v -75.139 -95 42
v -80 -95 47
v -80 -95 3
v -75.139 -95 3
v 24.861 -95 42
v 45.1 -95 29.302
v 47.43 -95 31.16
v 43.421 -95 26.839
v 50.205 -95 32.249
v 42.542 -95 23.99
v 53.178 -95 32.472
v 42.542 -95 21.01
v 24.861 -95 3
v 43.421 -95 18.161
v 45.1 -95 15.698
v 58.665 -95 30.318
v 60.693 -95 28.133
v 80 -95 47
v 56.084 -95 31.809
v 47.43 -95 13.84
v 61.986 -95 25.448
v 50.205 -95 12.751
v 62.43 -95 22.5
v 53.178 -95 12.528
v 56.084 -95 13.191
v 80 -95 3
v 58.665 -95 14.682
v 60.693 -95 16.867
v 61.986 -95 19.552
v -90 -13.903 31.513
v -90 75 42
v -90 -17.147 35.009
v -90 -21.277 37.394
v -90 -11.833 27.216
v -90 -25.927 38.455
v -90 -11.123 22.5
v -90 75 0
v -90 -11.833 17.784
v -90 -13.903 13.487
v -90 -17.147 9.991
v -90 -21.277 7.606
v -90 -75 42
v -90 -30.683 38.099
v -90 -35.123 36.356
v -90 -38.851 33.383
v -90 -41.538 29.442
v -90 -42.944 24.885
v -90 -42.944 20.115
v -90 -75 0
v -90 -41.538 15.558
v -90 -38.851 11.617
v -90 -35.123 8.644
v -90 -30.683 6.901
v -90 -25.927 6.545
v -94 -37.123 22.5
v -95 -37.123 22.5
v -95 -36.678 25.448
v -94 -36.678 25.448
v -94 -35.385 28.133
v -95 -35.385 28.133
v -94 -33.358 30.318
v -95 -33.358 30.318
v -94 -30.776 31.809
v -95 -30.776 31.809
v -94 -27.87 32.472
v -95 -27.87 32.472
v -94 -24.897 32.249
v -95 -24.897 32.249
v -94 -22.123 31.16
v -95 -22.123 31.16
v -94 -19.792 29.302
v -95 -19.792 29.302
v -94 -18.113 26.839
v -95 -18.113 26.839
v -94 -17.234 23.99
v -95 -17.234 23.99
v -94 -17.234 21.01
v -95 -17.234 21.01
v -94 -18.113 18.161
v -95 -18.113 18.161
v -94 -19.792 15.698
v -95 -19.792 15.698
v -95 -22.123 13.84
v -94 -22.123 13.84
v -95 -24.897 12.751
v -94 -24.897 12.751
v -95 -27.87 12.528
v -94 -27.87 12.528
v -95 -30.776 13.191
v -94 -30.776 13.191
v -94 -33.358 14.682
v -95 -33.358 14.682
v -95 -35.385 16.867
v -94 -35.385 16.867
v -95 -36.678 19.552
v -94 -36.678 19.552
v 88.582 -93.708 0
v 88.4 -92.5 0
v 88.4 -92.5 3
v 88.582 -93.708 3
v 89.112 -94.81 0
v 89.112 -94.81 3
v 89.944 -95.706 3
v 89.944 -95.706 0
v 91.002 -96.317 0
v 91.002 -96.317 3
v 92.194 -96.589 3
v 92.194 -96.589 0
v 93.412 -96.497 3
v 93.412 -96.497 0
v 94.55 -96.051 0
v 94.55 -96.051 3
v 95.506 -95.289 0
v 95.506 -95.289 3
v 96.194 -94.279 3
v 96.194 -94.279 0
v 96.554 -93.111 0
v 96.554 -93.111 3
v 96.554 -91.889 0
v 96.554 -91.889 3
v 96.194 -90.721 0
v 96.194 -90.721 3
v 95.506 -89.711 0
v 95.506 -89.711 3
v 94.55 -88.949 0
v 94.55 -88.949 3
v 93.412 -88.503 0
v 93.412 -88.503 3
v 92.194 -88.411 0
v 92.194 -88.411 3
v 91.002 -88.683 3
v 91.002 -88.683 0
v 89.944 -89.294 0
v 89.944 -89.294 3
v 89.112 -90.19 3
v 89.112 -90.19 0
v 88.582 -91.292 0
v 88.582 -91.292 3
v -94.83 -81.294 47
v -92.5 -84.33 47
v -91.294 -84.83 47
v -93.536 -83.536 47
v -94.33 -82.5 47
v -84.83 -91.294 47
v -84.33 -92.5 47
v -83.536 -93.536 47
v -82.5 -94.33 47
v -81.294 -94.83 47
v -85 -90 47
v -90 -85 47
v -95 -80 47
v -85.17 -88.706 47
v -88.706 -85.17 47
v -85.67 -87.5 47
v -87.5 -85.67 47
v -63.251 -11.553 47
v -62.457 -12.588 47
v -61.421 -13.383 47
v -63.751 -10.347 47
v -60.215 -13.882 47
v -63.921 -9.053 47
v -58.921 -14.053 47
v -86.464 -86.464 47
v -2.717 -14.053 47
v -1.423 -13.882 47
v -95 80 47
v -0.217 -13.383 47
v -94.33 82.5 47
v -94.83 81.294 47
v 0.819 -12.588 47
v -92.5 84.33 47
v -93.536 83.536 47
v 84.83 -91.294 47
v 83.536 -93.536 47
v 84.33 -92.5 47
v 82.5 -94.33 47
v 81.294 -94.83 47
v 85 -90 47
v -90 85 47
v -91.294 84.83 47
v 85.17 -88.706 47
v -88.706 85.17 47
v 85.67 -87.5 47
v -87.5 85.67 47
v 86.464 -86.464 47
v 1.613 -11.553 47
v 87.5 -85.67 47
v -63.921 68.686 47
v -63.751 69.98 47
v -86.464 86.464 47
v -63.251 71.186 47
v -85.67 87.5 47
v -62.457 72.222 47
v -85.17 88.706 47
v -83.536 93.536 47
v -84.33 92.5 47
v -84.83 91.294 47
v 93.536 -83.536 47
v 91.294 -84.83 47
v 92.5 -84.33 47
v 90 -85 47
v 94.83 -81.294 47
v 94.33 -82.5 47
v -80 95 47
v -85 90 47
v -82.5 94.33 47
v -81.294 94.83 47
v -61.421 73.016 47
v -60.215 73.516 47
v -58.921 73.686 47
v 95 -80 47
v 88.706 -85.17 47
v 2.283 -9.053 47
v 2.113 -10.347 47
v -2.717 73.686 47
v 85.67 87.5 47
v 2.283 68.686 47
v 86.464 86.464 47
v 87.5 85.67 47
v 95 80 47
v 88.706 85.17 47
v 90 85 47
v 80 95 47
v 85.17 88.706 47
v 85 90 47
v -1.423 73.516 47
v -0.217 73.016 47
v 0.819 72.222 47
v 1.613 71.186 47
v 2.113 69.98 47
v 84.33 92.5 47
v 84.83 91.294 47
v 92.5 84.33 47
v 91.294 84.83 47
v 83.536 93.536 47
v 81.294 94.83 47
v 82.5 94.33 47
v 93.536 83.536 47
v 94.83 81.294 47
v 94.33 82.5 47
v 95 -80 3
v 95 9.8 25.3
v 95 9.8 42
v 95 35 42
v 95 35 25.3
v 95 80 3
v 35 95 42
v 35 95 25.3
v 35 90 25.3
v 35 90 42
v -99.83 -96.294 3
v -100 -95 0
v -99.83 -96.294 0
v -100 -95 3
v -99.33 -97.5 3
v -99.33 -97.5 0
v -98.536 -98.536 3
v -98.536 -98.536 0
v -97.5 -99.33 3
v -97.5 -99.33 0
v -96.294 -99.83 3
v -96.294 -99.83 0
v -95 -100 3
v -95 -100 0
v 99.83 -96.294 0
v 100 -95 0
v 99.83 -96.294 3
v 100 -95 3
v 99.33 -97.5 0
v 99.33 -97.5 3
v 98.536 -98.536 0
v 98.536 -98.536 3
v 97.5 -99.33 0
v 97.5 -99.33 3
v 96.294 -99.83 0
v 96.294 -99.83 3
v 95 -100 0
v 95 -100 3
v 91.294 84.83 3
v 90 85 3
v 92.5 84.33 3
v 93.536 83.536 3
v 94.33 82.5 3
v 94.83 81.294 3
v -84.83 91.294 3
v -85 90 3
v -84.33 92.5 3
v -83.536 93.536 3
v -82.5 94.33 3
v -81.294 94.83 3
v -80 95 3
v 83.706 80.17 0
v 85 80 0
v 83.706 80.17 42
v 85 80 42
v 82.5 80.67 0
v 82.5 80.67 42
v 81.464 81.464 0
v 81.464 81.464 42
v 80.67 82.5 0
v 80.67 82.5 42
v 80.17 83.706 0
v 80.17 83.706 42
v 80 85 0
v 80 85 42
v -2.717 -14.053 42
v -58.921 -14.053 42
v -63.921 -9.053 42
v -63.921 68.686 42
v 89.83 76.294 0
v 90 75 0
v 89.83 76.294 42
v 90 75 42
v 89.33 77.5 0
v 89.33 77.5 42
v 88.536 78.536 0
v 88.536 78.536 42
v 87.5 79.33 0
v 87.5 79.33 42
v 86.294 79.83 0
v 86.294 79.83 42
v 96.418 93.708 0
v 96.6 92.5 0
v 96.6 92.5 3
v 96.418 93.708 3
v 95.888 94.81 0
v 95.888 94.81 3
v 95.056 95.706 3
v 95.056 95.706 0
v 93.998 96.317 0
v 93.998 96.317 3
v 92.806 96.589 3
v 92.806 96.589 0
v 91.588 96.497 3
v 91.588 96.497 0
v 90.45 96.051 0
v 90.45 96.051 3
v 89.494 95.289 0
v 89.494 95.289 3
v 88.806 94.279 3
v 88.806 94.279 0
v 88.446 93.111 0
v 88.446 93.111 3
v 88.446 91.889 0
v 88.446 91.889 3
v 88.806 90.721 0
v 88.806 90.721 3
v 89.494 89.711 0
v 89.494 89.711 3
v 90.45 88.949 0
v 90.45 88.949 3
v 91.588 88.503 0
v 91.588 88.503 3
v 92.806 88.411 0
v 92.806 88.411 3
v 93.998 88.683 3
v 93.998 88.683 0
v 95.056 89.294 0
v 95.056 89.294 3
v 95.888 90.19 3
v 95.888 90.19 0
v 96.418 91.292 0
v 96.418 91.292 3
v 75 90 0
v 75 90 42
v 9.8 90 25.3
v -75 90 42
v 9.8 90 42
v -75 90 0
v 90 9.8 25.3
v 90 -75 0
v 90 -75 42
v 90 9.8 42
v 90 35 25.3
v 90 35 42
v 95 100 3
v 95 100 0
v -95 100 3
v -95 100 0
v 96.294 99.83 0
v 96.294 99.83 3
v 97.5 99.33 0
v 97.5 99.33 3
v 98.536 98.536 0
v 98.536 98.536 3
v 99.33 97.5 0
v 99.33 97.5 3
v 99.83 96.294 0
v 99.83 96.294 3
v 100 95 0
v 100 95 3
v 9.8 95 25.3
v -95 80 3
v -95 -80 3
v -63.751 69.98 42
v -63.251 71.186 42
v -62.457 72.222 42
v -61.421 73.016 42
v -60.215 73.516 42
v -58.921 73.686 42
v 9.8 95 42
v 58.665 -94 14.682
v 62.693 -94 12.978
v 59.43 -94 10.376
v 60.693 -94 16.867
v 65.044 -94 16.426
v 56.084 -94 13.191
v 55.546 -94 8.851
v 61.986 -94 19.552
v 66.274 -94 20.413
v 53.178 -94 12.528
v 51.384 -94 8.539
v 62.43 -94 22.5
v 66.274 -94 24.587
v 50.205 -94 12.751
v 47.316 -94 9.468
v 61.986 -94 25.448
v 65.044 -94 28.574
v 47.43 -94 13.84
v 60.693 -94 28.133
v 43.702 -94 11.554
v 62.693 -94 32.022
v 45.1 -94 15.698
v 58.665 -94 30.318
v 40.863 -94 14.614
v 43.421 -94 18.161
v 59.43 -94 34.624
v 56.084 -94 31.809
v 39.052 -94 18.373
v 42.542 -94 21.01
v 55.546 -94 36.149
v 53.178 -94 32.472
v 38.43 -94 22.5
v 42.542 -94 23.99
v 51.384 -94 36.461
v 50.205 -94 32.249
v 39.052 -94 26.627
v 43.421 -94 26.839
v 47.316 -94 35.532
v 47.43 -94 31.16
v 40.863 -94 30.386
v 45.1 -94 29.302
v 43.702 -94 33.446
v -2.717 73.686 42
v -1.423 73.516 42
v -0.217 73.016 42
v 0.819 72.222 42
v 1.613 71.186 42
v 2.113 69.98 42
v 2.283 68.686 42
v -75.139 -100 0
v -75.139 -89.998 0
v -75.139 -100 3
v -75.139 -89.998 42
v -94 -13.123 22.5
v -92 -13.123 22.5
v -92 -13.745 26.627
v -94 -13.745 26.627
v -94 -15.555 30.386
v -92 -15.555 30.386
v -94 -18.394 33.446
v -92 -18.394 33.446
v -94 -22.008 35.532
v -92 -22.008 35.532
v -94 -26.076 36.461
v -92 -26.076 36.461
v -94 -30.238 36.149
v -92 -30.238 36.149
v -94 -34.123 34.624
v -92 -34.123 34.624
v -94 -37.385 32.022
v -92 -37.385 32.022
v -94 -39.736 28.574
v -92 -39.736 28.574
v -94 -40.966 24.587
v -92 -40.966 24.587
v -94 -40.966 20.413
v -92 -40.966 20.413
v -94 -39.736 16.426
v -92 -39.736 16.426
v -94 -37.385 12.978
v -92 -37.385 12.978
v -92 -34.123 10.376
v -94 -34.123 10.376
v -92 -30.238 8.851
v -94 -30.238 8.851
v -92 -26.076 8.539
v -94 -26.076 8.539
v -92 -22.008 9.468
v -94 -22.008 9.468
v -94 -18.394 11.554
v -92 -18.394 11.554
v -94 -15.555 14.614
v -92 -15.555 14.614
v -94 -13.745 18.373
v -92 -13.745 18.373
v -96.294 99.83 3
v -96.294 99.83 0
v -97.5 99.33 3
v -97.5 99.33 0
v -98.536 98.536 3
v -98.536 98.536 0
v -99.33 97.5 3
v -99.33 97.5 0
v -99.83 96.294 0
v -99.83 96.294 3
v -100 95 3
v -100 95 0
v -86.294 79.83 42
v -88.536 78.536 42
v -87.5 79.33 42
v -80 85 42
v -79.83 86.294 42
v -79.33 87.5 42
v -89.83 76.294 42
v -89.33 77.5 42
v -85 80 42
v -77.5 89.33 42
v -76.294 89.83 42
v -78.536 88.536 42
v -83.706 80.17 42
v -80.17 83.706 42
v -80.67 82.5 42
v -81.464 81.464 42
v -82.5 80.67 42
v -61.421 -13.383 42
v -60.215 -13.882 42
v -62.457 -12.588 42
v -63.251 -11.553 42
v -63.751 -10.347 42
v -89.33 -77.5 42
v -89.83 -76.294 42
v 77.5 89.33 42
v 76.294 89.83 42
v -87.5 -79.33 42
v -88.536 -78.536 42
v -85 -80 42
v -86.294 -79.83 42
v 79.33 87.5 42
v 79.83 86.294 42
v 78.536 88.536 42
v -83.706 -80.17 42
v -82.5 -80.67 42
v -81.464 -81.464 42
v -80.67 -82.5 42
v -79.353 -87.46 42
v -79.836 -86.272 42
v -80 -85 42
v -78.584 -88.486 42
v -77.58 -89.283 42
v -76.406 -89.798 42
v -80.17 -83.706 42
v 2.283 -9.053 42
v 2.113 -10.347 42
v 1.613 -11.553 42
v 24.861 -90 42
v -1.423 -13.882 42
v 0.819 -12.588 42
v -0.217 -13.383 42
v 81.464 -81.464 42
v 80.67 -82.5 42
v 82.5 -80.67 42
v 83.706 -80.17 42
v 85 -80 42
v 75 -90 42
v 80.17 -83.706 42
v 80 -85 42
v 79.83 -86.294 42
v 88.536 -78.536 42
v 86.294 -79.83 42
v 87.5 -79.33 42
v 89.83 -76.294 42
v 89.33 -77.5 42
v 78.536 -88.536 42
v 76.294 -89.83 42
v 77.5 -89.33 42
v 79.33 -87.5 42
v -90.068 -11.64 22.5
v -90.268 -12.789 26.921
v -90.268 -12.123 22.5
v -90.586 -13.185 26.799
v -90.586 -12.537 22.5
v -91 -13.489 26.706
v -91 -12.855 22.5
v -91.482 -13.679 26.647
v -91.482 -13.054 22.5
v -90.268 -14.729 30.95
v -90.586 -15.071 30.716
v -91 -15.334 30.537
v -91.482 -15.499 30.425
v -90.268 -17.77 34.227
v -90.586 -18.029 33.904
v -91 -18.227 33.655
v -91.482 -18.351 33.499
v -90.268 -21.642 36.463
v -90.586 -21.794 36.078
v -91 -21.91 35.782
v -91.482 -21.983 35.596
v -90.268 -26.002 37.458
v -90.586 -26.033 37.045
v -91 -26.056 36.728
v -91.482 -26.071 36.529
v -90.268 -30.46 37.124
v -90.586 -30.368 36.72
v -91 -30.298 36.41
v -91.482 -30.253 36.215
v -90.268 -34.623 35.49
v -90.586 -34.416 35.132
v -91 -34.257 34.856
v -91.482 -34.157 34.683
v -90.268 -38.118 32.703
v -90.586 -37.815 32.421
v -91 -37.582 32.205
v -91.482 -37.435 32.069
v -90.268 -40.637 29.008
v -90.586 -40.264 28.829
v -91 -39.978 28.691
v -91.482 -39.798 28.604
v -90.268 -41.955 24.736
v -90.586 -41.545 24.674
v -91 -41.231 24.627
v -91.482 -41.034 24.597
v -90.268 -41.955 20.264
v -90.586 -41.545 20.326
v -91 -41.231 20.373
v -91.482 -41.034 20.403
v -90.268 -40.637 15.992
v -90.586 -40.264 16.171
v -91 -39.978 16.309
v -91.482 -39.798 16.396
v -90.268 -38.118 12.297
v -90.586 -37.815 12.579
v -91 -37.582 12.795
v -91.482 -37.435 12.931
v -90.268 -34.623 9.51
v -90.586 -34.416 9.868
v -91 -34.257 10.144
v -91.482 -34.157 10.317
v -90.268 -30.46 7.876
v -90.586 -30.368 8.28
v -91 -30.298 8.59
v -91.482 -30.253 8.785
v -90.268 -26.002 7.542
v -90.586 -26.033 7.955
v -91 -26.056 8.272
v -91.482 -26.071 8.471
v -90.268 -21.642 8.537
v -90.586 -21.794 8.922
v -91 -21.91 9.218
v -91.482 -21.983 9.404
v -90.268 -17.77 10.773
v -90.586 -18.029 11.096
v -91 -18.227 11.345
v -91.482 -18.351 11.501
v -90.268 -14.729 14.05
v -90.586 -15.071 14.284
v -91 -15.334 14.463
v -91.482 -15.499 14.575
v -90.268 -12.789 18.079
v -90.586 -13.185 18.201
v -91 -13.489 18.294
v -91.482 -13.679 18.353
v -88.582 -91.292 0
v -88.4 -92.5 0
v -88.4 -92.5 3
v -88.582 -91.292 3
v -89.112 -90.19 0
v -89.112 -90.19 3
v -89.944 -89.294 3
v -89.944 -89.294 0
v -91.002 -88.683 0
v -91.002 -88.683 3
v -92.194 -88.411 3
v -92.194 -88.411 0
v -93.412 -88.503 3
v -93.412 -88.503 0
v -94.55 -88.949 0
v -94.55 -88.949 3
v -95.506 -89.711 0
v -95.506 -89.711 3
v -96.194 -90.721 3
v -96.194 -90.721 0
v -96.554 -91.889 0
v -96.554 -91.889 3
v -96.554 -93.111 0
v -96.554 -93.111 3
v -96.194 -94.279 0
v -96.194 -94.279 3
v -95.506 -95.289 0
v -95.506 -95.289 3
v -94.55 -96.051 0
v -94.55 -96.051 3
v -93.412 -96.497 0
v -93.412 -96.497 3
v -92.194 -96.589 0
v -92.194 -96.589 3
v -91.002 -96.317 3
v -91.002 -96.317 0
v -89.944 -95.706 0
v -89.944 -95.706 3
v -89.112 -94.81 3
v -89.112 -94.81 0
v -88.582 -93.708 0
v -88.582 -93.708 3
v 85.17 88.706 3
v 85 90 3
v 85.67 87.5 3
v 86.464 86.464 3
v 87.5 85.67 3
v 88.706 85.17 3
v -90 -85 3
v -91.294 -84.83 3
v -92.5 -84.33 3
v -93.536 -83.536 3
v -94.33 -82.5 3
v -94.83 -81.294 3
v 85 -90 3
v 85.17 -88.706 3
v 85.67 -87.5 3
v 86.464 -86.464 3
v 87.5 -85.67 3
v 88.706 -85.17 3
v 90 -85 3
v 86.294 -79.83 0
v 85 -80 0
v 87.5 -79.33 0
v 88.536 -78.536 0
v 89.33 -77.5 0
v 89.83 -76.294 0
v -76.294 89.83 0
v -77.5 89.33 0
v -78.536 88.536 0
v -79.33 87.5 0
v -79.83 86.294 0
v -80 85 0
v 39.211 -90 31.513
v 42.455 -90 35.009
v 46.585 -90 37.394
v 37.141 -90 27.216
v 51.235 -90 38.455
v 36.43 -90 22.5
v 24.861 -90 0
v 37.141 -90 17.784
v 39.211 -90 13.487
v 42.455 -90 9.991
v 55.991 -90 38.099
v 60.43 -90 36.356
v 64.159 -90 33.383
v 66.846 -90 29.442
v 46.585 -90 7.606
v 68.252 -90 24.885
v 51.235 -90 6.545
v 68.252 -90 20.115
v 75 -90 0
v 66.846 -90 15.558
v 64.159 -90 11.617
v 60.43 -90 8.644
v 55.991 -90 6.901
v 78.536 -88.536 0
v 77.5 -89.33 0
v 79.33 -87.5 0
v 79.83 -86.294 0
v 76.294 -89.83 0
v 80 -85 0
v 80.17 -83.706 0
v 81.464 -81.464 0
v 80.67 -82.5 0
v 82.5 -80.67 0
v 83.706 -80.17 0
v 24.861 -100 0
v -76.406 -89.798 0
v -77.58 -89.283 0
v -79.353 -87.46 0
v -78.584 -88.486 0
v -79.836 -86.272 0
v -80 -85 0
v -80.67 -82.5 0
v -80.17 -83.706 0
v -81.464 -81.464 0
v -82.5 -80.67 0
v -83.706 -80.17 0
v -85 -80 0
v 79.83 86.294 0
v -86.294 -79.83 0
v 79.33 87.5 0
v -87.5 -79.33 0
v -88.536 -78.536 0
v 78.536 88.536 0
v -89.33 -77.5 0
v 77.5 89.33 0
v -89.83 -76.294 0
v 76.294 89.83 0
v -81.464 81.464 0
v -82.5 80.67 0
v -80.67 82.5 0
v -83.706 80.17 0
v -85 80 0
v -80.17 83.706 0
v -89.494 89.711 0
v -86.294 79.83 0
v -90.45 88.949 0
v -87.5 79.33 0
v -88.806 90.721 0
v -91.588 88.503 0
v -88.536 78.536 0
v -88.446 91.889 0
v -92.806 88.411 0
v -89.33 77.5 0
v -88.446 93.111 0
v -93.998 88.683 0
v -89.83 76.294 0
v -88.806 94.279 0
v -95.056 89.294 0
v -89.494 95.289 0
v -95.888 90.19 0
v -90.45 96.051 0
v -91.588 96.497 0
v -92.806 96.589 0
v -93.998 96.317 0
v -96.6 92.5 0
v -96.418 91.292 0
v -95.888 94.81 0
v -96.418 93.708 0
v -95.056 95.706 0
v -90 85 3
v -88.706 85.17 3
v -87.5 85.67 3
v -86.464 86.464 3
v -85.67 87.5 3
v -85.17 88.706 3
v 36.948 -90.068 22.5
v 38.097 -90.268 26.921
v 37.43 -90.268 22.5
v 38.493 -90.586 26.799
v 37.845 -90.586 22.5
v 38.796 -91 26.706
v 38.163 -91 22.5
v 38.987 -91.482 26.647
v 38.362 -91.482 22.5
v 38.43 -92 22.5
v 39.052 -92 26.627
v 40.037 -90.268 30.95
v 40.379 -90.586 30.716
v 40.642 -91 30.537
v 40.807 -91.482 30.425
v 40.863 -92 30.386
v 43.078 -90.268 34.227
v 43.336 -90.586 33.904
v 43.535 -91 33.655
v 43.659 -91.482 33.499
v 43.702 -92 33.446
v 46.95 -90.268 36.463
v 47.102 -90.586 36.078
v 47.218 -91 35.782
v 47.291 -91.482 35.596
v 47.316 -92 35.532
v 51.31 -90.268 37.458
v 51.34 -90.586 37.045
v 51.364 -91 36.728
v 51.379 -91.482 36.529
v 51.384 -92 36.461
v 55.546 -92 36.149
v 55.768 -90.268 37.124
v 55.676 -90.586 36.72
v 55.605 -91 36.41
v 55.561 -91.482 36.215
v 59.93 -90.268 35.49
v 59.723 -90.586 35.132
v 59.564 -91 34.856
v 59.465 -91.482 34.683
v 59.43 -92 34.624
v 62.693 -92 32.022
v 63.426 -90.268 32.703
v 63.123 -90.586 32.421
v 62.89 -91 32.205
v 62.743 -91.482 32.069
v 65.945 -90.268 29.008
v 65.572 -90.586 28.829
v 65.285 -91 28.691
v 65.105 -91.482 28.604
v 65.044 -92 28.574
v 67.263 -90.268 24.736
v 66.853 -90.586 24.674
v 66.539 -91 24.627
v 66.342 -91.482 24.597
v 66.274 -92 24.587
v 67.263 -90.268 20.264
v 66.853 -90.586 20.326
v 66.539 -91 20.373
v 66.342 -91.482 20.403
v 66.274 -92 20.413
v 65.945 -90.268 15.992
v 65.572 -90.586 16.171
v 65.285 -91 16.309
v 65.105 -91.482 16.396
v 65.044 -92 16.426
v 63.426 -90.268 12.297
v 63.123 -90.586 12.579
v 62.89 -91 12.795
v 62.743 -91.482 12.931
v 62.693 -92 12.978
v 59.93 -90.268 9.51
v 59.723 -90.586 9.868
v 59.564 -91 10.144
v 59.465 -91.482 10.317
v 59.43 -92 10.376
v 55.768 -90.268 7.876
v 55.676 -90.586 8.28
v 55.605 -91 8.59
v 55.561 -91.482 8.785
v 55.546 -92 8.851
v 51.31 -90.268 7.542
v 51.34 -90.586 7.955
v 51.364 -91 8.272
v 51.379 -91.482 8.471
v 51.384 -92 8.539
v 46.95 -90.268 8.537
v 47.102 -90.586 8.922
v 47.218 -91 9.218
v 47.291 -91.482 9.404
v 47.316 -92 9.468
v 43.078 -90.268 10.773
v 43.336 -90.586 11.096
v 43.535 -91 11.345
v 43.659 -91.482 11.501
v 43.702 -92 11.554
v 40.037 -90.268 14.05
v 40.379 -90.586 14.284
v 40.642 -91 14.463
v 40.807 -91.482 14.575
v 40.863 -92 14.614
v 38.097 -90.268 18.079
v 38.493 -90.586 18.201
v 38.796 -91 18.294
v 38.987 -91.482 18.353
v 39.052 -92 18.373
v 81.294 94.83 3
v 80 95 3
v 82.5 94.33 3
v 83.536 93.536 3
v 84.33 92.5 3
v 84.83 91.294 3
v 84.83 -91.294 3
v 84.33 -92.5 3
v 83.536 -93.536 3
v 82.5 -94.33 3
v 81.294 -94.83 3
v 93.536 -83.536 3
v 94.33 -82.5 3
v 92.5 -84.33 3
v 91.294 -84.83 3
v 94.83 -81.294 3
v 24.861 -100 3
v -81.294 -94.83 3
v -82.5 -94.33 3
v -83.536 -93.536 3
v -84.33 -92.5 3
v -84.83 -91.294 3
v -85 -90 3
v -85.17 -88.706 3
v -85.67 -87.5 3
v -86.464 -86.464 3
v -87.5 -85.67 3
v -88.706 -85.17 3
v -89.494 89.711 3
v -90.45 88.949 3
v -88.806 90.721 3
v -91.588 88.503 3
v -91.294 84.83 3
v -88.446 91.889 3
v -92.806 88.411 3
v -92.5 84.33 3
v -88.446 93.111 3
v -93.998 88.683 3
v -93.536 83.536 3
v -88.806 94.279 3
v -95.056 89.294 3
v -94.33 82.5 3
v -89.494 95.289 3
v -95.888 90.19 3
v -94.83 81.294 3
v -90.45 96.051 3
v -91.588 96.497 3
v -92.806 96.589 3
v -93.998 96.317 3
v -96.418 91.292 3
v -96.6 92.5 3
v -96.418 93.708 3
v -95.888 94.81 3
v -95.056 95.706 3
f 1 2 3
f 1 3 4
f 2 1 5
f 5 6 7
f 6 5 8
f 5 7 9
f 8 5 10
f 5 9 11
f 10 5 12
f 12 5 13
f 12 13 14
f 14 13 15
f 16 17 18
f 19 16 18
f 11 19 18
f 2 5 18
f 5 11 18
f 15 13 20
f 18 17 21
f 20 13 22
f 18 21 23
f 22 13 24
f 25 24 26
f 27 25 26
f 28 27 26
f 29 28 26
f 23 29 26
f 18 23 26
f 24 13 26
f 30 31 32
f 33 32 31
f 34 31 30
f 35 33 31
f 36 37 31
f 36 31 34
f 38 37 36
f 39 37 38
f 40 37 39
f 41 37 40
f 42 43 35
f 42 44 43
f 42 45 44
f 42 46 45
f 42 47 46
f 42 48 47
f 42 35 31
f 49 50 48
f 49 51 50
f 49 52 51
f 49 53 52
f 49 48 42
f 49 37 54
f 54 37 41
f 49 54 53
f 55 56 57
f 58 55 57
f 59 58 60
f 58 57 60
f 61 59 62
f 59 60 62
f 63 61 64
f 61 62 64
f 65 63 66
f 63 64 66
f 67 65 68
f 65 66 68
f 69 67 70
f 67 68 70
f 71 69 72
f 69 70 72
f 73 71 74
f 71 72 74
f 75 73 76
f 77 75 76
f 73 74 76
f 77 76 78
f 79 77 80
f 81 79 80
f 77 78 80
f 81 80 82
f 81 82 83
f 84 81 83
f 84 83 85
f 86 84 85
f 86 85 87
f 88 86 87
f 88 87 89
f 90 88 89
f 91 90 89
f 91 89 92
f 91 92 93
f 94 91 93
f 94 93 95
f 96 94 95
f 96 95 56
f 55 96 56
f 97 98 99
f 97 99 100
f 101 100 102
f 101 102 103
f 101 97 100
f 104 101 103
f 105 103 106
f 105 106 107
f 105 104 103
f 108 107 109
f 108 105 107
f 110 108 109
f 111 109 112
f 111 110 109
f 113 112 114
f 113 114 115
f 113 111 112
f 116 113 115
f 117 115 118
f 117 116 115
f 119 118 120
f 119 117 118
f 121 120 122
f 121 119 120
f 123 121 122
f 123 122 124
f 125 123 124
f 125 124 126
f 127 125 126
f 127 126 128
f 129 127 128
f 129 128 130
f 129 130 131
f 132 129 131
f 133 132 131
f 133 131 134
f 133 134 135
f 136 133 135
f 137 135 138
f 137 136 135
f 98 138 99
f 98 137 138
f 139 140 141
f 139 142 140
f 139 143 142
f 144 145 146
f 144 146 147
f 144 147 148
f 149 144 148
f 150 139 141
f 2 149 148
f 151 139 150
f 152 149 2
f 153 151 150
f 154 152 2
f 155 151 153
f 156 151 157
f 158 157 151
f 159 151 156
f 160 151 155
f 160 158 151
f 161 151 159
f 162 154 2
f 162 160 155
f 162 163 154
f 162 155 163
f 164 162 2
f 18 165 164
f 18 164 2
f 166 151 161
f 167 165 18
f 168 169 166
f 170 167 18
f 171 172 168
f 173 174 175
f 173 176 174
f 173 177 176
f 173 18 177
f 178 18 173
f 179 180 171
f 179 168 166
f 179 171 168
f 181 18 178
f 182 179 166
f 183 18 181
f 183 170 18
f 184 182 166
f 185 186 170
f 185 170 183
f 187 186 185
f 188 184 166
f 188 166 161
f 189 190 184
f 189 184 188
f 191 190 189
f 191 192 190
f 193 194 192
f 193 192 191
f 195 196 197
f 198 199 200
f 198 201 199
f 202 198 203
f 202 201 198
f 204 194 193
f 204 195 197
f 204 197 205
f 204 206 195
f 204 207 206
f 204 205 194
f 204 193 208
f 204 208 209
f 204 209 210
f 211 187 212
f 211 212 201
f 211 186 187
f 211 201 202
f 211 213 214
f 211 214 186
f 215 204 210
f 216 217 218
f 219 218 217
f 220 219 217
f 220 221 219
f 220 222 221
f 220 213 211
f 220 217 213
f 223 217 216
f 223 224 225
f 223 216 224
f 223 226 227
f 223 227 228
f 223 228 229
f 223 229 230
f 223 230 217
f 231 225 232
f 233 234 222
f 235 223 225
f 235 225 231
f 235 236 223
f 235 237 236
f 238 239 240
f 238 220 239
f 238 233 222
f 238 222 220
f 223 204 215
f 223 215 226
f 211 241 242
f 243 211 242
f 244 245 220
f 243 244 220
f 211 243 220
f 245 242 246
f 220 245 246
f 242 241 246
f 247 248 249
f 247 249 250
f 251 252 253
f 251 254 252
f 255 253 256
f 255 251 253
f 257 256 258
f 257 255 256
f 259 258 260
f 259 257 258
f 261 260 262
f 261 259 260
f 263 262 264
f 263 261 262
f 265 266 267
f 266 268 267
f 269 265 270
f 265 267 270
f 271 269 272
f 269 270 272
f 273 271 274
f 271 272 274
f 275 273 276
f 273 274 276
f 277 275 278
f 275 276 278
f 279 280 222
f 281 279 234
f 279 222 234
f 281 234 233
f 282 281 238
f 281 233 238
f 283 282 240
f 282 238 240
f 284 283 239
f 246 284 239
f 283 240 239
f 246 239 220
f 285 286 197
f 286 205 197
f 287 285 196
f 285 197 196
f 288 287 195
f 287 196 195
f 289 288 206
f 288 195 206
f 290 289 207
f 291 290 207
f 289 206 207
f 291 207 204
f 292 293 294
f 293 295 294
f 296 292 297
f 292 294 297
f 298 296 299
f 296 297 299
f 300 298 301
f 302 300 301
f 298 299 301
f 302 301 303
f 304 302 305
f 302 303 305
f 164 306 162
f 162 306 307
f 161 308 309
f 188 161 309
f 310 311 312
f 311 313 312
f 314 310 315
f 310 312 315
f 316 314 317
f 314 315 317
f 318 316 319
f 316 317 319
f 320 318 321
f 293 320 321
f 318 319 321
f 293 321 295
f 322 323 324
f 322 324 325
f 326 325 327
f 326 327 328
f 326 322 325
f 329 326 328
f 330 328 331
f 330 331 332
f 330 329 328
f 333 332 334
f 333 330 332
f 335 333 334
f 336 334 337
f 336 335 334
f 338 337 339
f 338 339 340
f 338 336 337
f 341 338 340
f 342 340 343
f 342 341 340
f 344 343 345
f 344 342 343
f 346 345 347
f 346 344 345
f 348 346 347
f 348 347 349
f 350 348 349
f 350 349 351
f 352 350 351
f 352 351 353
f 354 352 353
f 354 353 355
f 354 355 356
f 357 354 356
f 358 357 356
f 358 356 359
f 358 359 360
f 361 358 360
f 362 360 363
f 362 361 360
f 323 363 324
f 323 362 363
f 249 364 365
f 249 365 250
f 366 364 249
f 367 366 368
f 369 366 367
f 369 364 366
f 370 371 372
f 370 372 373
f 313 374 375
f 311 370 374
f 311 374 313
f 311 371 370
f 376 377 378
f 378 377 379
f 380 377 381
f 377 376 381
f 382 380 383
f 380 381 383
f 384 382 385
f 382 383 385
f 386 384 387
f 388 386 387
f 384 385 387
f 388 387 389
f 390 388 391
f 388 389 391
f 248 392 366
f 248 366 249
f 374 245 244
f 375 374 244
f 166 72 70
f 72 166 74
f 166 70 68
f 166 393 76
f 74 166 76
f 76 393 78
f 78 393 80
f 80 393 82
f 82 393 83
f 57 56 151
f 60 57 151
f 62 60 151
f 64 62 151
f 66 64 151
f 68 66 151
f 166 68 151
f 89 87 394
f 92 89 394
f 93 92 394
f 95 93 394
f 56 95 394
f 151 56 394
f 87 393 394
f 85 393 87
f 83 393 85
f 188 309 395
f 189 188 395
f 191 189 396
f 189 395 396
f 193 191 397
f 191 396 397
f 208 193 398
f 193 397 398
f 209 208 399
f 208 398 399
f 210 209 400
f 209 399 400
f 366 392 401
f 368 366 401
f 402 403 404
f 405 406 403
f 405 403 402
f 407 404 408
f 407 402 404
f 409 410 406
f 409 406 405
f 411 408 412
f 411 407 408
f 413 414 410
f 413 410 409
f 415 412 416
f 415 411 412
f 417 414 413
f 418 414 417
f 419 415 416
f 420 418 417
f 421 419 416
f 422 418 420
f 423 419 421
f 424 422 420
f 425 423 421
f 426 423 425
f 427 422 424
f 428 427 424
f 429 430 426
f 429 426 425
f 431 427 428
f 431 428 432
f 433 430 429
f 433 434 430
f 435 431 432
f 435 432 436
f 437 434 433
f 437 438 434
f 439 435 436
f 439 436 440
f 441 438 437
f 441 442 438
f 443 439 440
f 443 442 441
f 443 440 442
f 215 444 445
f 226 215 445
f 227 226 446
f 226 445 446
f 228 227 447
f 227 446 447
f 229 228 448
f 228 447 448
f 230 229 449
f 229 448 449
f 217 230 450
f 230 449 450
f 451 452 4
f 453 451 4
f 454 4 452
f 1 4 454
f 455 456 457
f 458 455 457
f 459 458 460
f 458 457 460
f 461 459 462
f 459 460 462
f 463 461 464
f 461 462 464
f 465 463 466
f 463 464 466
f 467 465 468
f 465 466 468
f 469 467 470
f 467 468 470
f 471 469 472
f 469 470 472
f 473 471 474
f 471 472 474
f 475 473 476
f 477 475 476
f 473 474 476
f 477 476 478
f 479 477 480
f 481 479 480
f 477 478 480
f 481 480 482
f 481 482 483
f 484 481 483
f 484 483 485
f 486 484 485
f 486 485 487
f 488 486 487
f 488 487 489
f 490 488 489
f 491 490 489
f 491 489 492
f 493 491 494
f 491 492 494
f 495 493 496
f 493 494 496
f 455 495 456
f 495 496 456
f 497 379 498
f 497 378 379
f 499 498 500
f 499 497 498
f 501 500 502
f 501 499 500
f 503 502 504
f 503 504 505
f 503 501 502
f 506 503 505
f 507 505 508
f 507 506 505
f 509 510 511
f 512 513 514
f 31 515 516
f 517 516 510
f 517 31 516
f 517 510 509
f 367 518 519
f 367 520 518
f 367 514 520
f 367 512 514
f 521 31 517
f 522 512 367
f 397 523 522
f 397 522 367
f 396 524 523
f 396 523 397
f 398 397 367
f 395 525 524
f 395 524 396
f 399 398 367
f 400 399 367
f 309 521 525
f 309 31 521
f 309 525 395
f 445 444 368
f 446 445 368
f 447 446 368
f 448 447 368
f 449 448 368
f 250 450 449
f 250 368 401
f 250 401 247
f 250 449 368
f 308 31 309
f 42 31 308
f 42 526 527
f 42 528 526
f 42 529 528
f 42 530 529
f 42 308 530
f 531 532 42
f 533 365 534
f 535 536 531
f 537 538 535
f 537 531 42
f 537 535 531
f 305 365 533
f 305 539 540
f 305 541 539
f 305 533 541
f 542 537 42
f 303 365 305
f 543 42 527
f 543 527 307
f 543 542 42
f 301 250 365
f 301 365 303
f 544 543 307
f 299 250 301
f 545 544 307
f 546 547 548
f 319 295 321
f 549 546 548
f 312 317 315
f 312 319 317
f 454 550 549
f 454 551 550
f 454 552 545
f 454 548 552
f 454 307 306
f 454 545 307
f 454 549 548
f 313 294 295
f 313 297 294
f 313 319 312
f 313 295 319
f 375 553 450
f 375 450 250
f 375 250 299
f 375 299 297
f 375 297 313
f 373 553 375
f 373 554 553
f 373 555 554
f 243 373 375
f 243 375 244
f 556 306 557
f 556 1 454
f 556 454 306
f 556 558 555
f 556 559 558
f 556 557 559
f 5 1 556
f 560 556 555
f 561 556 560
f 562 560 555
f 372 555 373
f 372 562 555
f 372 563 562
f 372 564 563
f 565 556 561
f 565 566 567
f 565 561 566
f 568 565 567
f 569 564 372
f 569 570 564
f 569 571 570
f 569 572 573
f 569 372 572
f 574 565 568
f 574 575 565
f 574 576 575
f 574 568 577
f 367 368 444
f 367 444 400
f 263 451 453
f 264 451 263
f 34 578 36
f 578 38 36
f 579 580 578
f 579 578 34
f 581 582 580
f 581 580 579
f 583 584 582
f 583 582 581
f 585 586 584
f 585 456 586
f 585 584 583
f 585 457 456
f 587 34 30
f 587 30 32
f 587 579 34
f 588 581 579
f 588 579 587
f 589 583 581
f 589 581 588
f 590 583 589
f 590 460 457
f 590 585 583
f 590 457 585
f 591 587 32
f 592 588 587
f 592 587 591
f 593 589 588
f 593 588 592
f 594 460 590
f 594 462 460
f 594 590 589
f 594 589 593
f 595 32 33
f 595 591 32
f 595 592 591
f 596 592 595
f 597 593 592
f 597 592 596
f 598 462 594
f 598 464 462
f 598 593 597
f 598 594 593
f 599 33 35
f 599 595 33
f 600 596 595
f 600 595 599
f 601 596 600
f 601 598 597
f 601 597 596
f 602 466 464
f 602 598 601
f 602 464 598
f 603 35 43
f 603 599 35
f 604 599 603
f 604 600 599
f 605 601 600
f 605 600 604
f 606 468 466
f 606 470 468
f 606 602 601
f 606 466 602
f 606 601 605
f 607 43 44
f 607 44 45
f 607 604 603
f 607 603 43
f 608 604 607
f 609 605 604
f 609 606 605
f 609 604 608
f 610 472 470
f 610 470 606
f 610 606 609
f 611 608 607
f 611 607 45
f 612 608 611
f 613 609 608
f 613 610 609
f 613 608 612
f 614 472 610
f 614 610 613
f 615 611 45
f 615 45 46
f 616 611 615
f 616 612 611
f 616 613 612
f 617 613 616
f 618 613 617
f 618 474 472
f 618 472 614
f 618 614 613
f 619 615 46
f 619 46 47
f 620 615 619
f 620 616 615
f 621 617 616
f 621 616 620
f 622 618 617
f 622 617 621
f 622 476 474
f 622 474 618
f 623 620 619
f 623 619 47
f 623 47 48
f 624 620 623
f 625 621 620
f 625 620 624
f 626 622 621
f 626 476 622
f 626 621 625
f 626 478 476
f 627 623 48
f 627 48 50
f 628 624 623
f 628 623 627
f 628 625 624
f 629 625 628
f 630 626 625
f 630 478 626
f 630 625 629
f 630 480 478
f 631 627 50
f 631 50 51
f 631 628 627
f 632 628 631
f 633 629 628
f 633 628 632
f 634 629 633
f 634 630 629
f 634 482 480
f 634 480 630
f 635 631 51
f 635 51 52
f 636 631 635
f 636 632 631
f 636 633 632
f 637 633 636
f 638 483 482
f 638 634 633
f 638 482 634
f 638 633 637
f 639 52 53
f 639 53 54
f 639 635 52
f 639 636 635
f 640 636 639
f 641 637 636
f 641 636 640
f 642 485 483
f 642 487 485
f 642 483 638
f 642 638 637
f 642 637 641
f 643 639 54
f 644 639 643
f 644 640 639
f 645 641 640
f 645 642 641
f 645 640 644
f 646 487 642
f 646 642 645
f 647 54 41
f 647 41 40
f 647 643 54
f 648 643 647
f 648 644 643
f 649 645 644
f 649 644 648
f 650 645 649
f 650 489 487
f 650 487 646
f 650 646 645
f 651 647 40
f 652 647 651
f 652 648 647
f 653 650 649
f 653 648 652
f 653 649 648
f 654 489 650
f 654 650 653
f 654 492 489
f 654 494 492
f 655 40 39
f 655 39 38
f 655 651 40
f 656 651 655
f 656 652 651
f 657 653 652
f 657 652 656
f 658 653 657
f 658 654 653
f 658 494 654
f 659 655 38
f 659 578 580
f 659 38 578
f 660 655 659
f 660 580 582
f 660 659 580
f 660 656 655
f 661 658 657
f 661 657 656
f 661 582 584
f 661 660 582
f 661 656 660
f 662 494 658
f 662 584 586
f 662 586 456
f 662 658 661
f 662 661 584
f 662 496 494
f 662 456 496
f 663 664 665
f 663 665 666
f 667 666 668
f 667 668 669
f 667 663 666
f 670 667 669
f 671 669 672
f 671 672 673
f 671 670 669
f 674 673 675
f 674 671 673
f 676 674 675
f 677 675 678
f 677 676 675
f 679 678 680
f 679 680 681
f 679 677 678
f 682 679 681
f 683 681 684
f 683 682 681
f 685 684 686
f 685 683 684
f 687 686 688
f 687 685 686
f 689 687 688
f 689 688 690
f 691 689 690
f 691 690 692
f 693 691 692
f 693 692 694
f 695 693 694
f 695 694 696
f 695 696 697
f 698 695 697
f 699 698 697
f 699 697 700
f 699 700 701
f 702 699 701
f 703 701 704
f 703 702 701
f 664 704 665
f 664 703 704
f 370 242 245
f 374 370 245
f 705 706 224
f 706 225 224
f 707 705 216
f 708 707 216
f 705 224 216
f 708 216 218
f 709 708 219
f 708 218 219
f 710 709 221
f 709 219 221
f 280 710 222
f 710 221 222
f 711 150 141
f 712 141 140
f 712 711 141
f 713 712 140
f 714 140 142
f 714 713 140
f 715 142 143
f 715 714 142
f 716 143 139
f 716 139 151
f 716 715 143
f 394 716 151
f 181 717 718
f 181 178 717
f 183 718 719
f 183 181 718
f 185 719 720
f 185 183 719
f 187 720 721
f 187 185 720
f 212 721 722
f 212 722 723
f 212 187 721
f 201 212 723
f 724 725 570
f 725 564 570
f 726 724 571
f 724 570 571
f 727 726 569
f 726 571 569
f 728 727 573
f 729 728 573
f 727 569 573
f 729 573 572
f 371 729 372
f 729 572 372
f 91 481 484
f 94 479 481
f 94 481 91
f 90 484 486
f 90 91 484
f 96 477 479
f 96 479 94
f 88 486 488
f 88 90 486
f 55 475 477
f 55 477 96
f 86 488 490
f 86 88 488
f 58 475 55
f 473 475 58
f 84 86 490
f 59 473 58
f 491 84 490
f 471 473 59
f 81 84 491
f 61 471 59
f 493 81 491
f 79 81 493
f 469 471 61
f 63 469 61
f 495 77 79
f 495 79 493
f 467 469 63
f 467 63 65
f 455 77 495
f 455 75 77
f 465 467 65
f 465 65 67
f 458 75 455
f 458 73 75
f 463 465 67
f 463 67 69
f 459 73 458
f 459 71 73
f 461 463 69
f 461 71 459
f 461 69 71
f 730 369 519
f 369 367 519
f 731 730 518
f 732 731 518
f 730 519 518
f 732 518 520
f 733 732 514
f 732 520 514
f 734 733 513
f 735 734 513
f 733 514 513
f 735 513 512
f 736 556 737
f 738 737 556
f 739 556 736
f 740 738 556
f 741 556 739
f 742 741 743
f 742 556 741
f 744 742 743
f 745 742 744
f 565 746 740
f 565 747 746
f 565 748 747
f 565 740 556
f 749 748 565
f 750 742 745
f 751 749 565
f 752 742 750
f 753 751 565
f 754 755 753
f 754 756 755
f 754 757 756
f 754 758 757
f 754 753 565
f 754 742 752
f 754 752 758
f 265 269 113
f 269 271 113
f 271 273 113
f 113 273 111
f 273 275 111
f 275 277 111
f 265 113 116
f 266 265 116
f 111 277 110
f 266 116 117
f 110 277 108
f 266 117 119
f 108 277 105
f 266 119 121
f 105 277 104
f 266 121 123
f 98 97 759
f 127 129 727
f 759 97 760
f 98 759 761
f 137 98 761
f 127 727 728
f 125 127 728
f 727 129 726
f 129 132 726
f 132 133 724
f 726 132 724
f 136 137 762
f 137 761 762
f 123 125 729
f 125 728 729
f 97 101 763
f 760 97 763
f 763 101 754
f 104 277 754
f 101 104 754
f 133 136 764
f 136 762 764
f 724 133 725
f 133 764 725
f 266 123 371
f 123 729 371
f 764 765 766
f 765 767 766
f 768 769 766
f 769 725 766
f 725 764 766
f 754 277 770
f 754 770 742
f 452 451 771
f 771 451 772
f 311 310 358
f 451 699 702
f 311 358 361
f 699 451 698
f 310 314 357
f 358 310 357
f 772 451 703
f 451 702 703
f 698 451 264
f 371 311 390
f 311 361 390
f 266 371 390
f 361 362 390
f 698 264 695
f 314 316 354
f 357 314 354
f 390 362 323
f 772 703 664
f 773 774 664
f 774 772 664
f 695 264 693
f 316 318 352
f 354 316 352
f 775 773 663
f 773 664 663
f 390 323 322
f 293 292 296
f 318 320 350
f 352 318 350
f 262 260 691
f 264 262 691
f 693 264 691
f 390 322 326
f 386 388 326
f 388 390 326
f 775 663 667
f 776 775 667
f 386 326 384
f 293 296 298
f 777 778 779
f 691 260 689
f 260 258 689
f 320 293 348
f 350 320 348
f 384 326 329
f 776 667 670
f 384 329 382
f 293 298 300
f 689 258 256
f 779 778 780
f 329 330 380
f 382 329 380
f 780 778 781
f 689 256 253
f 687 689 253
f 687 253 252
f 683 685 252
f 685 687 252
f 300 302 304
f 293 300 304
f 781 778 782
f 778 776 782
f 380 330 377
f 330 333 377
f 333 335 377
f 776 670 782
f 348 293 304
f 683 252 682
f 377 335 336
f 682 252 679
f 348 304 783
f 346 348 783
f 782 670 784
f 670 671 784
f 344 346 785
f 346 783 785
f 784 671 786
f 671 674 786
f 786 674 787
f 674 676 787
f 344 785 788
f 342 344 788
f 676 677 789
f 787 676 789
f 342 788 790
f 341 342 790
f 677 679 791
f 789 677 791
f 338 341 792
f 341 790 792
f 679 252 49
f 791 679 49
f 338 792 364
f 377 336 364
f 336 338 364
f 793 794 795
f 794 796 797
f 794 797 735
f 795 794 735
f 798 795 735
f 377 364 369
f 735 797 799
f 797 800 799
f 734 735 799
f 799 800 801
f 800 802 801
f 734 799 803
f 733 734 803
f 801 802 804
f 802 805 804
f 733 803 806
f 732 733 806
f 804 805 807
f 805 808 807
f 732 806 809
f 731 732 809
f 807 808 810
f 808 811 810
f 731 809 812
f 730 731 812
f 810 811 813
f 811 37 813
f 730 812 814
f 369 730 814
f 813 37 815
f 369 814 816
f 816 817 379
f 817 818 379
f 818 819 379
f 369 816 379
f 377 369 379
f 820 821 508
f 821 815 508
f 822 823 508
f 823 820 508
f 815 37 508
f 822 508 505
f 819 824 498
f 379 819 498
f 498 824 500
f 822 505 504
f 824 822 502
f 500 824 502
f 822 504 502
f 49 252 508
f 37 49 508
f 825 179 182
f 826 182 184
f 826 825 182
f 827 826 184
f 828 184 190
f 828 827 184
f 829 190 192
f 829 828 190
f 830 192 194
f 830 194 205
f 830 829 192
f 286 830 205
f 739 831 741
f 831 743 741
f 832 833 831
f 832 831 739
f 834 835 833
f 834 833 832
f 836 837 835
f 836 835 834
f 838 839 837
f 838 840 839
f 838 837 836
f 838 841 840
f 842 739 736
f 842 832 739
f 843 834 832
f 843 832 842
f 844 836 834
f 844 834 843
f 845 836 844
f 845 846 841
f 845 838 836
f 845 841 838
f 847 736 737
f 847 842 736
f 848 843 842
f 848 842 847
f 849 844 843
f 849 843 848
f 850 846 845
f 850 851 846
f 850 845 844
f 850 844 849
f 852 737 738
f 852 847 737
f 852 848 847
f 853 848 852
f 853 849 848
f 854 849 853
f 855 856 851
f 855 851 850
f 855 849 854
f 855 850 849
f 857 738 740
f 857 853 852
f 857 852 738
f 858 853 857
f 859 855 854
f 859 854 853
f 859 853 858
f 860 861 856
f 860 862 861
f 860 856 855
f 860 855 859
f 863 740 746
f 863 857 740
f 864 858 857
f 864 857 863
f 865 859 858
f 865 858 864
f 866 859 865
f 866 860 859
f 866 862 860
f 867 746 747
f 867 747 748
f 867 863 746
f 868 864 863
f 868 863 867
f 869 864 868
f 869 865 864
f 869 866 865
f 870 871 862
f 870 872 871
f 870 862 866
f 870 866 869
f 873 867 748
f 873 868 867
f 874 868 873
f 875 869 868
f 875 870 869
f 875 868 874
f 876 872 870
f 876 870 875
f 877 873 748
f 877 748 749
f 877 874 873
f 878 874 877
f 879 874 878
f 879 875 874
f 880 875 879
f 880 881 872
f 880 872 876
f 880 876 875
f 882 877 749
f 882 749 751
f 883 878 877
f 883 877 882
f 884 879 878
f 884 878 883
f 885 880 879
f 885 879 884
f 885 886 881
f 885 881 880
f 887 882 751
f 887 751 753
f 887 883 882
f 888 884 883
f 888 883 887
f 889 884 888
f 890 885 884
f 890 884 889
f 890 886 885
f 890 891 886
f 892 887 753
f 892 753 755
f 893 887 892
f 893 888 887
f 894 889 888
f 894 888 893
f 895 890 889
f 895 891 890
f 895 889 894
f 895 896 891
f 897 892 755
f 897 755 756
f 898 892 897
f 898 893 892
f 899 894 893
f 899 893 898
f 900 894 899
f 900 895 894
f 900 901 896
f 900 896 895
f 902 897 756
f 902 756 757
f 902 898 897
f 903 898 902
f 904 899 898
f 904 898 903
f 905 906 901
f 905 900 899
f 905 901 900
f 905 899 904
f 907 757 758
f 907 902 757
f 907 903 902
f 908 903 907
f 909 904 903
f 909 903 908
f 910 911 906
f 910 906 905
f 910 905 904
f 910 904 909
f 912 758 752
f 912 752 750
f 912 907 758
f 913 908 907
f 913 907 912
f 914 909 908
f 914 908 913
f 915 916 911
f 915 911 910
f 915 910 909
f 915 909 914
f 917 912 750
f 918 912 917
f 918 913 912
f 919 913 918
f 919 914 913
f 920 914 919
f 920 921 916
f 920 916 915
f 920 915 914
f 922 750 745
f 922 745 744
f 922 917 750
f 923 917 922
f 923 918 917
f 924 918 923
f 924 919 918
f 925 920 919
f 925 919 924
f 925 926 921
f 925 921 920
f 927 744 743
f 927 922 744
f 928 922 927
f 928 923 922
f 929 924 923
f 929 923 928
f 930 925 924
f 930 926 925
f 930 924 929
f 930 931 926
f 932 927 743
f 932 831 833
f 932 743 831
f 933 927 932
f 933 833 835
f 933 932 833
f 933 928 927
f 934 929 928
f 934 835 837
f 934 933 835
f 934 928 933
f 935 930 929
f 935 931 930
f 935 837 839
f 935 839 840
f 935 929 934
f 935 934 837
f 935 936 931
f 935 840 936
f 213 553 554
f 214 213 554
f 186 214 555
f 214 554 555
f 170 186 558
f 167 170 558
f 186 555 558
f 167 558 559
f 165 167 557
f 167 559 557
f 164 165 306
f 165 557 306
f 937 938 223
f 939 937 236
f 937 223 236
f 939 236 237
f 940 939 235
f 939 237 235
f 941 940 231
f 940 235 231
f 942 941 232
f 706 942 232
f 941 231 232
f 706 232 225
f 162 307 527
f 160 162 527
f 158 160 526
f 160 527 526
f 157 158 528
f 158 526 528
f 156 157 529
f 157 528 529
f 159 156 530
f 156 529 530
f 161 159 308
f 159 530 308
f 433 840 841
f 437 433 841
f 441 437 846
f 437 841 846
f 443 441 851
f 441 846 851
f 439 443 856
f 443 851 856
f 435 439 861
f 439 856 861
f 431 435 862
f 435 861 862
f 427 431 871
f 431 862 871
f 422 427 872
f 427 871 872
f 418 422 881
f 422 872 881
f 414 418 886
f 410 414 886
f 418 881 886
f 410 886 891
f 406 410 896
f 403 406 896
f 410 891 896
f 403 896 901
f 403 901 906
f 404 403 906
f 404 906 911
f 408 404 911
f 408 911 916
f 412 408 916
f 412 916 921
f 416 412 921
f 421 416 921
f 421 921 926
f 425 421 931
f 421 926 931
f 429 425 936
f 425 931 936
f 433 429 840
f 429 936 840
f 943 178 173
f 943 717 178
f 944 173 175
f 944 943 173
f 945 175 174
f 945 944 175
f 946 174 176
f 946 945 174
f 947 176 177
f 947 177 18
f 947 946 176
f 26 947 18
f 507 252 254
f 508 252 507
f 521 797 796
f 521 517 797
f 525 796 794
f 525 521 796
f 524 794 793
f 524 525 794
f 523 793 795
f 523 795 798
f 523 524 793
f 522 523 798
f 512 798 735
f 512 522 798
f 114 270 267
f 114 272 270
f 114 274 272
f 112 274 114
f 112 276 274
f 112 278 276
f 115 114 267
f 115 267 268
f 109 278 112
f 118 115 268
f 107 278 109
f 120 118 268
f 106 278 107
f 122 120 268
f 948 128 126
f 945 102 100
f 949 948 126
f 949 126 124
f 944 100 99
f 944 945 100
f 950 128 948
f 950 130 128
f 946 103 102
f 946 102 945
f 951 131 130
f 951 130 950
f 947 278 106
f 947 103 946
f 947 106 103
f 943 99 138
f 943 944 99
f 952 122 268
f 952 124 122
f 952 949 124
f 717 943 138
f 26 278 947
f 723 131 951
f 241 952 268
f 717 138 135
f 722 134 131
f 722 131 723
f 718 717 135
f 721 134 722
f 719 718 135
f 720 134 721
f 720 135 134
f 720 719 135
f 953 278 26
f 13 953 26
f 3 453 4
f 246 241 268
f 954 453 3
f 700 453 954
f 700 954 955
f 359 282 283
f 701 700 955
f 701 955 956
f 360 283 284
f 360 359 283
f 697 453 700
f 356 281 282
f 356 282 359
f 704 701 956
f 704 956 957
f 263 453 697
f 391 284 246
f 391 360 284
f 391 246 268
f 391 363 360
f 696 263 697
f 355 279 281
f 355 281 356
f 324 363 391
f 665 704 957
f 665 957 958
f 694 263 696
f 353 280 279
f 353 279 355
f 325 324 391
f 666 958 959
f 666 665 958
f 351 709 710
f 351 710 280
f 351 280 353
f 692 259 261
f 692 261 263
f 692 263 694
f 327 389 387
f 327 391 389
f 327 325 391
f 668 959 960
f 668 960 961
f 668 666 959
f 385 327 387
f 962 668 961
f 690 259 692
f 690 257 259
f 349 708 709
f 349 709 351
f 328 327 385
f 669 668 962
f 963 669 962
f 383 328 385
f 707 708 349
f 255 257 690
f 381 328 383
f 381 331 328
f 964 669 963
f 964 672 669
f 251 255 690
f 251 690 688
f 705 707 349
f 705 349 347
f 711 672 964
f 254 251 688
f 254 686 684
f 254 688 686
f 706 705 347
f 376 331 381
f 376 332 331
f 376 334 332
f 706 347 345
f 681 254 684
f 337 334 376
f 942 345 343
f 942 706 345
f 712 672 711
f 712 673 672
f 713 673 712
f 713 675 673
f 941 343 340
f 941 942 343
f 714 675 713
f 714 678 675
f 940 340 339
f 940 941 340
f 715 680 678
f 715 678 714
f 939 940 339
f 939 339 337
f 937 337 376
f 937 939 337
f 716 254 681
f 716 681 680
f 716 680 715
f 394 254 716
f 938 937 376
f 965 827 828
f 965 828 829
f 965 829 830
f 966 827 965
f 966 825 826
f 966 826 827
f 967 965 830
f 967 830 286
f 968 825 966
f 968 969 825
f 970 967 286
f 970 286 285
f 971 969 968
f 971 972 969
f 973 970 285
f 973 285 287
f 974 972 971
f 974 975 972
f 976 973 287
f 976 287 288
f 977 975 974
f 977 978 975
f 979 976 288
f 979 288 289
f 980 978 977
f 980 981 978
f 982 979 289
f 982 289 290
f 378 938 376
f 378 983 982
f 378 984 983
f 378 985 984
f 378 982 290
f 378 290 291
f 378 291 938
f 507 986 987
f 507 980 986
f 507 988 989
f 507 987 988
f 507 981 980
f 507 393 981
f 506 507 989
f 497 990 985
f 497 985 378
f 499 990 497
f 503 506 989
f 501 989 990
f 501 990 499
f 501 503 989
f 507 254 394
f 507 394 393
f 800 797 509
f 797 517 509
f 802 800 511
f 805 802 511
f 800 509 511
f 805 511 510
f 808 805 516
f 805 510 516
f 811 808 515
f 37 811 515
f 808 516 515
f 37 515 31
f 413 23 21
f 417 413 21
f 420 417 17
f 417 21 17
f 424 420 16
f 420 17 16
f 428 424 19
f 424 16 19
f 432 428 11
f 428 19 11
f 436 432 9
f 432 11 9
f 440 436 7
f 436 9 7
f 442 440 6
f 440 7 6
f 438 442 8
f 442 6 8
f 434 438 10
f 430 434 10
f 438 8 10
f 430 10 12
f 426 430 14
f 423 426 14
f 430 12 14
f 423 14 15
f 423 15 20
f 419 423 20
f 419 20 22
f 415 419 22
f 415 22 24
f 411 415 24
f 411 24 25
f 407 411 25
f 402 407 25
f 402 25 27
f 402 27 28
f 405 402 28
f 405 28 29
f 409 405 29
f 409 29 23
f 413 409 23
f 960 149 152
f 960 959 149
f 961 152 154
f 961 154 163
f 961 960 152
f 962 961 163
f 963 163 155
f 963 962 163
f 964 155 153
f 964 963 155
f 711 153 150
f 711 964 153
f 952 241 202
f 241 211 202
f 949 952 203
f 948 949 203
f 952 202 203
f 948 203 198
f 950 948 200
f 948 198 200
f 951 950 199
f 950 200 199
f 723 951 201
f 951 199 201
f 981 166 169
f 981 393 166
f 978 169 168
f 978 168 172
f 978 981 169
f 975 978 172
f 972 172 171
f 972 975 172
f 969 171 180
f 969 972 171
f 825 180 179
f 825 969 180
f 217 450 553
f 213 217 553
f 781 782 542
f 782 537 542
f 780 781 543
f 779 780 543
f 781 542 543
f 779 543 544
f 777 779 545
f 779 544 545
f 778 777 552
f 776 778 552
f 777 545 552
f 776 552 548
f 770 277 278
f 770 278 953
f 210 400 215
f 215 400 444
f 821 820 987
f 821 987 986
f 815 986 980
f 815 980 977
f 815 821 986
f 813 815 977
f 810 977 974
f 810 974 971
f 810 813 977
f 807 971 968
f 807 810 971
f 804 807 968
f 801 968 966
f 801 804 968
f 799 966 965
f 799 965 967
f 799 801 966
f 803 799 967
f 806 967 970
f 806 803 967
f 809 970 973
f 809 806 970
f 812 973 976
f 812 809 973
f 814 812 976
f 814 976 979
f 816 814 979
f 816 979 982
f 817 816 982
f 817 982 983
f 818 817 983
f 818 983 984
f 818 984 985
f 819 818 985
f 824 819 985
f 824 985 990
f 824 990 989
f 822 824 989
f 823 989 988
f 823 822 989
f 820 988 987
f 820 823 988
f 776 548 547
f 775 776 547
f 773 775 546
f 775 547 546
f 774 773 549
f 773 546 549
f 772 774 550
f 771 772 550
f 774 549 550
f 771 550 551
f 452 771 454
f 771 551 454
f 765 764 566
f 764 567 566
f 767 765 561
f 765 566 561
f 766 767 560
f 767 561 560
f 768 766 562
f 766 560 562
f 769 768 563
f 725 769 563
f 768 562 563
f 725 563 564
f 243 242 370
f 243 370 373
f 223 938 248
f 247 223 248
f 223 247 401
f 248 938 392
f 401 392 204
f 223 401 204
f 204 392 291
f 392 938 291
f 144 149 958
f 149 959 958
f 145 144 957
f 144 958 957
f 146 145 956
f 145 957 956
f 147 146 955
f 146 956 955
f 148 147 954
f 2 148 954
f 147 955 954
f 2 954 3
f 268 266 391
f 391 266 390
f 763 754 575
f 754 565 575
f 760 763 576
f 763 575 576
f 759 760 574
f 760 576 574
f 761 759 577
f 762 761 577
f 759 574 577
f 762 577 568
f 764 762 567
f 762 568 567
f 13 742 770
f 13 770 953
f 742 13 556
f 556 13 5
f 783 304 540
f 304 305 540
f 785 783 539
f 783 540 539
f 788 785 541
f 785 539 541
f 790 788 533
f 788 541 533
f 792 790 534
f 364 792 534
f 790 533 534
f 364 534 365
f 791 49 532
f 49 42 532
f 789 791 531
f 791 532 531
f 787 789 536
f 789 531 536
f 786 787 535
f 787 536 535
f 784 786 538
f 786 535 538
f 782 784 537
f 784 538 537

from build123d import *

# Parameters (mm, degrees)
CROQUIS1_W                   = 200
CROQUIS1_H                   = 200
CROQUIS1_R                   = 4.1
SALIENTE_EXTRUIR1_DEPTH      = 3
SALIENTE_EXTRUIR2_DEPTH      = 39
SALIENTE_EXTRUIR2_DEPTH_BACK = 3
SALIENTE_EXTRUIR3_DEPTH      = 5
REDONDEO1_R                  = 5
CROQUIS5_W                   = 100
CROQUIS5_H                   = 42
CORTAR_EXTRUIR2_DEPTH        = 12
CROQUIS6_R                   = 10
CORTAR_EXTRUIR3_DEPTH        = 10
CROQUIS7_R                   = 14
CORTAR_EXTRUIR4_DEPTH        = 4
REDONDEO2_R                  = 2
CROQUIS8_R                   = 10
CORTAR_EXTRUIR5_DEPTH        = 10
CROQUIS9_R                   = 14
CORTAR_EXTRUIR6_DEPTH        = 4
REDONDEO3_R                  = 2
CROQUIS11_W                  = 25.2
CROQUIS11_H                  = 16.7
CORTAR_EXTRUIR8_DEPTH        = 5
CROQUIS12_W                  = 25.2
CROQUIS12_H                  = 16.7
CORTAR_EXTRUIR9_DEPTH        = 5


with BuildPart() as part:
    # Croquis1 → Saliente-Extruir1 (new body)
    with BuildSketch(Plane(origin=(0, 0, 0), x_dir=(0, 1, 0), z_dir=(0, 0, 1))):
        Rectangle(CROQUIS1_W, CROQUIS1_H)
        with Locations(Location((-92.5, 92.5, 0), (0, 0, 270))):
            Circle(CROQUIS1_R, mode=Mode.SUBTRACT)
        with Locations(Location((92.5, 92.5, 0), (0, 0, 90))):
            Circle(CROQUIS1_R, mode=Mode.SUBTRACT)
        with Locations(Location((92.5, -92.5, 0), (0, 0, 270))):
            Circle(CROQUIS1_R, mode=Mode.SUBTRACT)
        with Locations(Location((-92.5, -92.5, 0), (0, 0, 90))):
            Circle(CROQUIS1_R, mode=Mode.SUBTRACT)
        Polygon((-95, 85), (-85, 85), (-85, 95), (85, 95), (85, 85), (95, 85), (95, -85), (85, -85), (85, -95), (-85, -95), (-85, -85), (-95, -85), align=None, mode=Mode.SUBTRACT)
    extrude(amount=SALIENTE_EXTRUIR1_DEPTH)

    # Croquis2 → Saliente-Extruir2 (add, two sides: drawn at the far end of the back side and taken through both)
    with BuildSketch(Plane.XY.offset(3).offset(-SALIENTE_EXTRUIR2_DEPTH_BACK)):
        Polygon((85, -85), (85, -95), (-85, -95), (-85, -85), (-95, -85), (-95, 85), (-85, 85), (-85, 95), (85, 95), (85, 85), (95, 85), (95, -85), align=None)
        Polygon((80, 90), (-80, 90), (-80, 80), (-90, 80), (-90, -80), (-80, -80), (-80, -90), (80, -90), (80, -80), (90, -80), (90, 80), (80, 80), align=None, mode=Mode.SUBTRACT)
    extrude(amount=SALIENTE_EXTRUIR2_DEPTH + SALIENTE_EXTRUIR2_DEPTH_BACK)

    # Croquis3 → Saliente-Extruir3 (add)
    with BuildSketch(Plane.XY.offset(42)):
        Polygon((85, -95), (85, -85), (95, -85), (95, 85), (85, 85), (85, 95), (-85, 95), (-85, 85), (-95, 85), (-95, -85), (-85, -85), (-85, -95), align=None)
        with BuildLine():
            Line((-58.921212306, 73.686200925), (-2.716957181, 73.686200925))
            ThreePointArc((-2.716957181, 73.686200925), (0.818576725, 72.221734831), (2.283042819, 68.686200925))
            Line((2.283042819, 68.686200925), (2.283042819, -9.052528374))
            ThreePointArc((2.283042819, -9.052528374), (0.818576725, -12.58806228), (-2.716957181, -14.052528374))
            Line((-2.716957181, -14.052528374), (-58.921212306, -14.052528374))
            ThreePointArc((-58.921212306, -14.052528374), (-62.456746212, -12.58806228), (-63.921212306, -9.052528374))
            Line((-63.921212306, -9.052528374), (-63.921212306, 68.686200925))
            ThreePointArc((-63.921212306, 68.686200925), (-62.456746212, 72.221734831), (-58.921212306, 73.686200925))
        make_face(mode=Mode.SUBTRACT)
    extrude(amount=SALIENTE_EXTRUIR3_DEPTH)

    # Redondeo1
    redondeo1_edges = [part.edges().sort_by_distance(p)[0] for p in [
        (-85, -85, 25),
        (-95, -85, 25),
        (-85, -95, 25),
        (95, -85, 25),
        (85, -85, 25),
        (85, -95, 25),
        (95, 85, 25),
        (85, 85, 25),
        (85, 95, 25),
        (-85, 85, 25),
        (-85, 95, 25),
        (-95, 85, 25),
        (100, 100, 1.5),
        (-100, 100, 1.5),
        (-100, -100, 1.5),
        (100, -100, 1.5),
        (-90, 80, 21),
        (-80, 80, 21),
        (-80, 90, 21),
        (80, 90, 21),
        (80, 80, 21),
        (90, 80, 21),
        (90, -80, 21),
        (80, -80, 21),
        (80, -90, 21),
        (-80, -90, 21),
        (-80, -80, 21),
        (-90, -80, 21),
    ]]
    fillet(redondeo1_edges, radius=REDONDEO1_R - 0.0001)  # a hair under: the kernel refuses the full size

    # Croquis5 → Cortar-Extruir2 (cut)
    with BuildSketch(Plane.XZ.offset(100)):
        with Locations((-25.139020419, 21)):
            Rectangle(CROQUIS5_W, CROQUIS5_H)
    extrude(amount=-CORTAR_EXTRUIR2_DEPTH, mode=Mode.SUBTRACT)

    # Croquis6 → Cortar-Extruir3 (cut)
    with BuildSketch(Plane.XZ.offset(95)):
        with Locations((52.430489791, 22.5)):
            Circle(CROQUIS6_R)
    extrude(amount=-CORTAR_EXTRUIR3_DEPTH, mode=Mode.SUBTRACT)

    # Croquis7 → Cortar-Extruir4 (cut)
    with BuildSketch(Plane(origin=(0, -90, 0), x_dir=(-1, 0, 0), z_dir=(0, 1, 0))):
        with Locations((-52.430489791, 22.5)):
            Circle(CROQUIS7_R)
    extrude(amount=-CORTAR_EXTRUIR4_DEPTH, mode=Mode.SUBTRACT)

    # Redondeo2
    redondeo2_edges = [part.edges().sort_by_distance(p)[0] for p in [
        (66.430489791, -90, 22.5),
    ]]
    fillet(redondeo2_edges, radius=REDONDEO2_R)

    # Croquis8 → Cortar-Extruir5 (cut)
    with BuildSketch(Plane(origin=(-95, 0, 0), x_dir=(0, -1, 0), z_dir=(-1, 0, 0))):
        with Locations((27.122609876, 22.5)):
            Circle(CROQUIS8_R)
    extrude(amount=-CORTAR_EXTRUIR5_DEPTH, mode=Mode.SUBTRACT)

    # Croquis9 → Cortar-Extruir6 (cut)
    with BuildSketch(Plane.YZ.offset(-90)):
        with Locations((-27.122609876, 22.5)):
            Circle(CROQUIS9_R)
    extrude(amount=-CORTAR_EXTRUIR6_DEPTH, mode=Mode.SUBTRACT)

    # Redondeo3
    redondeo3_edges = [part.edges().sort_by_distance(p)[0] for p in [
        (-90, -41.122609876, 22.5),
    ]]
    fillet(redondeo3_edges, radius=REDONDEO3_R)

    # Croquis11 → Cortar-Extruir8 (cut)
    with BuildSketch(Plane.XZ.offset(-95)):
        with Locations((22.4, 33.65)):
            Rectangle(CROQUIS11_W, CROQUIS11_H)
    extrude(amount=CORTAR_EXTRUIR8_DEPTH, mode=Mode.SUBTRACT)

    # Croquis12 → Cortar-Extruir9 (cut)
    with BuildSketch(Plane.YZ.offset(95)):
        with Locations((22.4, 33.65)):
            Rectangle(CROQUIS12_W, CROQUIS12_H)
    extrude(amount=-CORTAR_EXTRUIR9_DEPTH, mode=Mode.SUBTRACT)


solid = part.part
